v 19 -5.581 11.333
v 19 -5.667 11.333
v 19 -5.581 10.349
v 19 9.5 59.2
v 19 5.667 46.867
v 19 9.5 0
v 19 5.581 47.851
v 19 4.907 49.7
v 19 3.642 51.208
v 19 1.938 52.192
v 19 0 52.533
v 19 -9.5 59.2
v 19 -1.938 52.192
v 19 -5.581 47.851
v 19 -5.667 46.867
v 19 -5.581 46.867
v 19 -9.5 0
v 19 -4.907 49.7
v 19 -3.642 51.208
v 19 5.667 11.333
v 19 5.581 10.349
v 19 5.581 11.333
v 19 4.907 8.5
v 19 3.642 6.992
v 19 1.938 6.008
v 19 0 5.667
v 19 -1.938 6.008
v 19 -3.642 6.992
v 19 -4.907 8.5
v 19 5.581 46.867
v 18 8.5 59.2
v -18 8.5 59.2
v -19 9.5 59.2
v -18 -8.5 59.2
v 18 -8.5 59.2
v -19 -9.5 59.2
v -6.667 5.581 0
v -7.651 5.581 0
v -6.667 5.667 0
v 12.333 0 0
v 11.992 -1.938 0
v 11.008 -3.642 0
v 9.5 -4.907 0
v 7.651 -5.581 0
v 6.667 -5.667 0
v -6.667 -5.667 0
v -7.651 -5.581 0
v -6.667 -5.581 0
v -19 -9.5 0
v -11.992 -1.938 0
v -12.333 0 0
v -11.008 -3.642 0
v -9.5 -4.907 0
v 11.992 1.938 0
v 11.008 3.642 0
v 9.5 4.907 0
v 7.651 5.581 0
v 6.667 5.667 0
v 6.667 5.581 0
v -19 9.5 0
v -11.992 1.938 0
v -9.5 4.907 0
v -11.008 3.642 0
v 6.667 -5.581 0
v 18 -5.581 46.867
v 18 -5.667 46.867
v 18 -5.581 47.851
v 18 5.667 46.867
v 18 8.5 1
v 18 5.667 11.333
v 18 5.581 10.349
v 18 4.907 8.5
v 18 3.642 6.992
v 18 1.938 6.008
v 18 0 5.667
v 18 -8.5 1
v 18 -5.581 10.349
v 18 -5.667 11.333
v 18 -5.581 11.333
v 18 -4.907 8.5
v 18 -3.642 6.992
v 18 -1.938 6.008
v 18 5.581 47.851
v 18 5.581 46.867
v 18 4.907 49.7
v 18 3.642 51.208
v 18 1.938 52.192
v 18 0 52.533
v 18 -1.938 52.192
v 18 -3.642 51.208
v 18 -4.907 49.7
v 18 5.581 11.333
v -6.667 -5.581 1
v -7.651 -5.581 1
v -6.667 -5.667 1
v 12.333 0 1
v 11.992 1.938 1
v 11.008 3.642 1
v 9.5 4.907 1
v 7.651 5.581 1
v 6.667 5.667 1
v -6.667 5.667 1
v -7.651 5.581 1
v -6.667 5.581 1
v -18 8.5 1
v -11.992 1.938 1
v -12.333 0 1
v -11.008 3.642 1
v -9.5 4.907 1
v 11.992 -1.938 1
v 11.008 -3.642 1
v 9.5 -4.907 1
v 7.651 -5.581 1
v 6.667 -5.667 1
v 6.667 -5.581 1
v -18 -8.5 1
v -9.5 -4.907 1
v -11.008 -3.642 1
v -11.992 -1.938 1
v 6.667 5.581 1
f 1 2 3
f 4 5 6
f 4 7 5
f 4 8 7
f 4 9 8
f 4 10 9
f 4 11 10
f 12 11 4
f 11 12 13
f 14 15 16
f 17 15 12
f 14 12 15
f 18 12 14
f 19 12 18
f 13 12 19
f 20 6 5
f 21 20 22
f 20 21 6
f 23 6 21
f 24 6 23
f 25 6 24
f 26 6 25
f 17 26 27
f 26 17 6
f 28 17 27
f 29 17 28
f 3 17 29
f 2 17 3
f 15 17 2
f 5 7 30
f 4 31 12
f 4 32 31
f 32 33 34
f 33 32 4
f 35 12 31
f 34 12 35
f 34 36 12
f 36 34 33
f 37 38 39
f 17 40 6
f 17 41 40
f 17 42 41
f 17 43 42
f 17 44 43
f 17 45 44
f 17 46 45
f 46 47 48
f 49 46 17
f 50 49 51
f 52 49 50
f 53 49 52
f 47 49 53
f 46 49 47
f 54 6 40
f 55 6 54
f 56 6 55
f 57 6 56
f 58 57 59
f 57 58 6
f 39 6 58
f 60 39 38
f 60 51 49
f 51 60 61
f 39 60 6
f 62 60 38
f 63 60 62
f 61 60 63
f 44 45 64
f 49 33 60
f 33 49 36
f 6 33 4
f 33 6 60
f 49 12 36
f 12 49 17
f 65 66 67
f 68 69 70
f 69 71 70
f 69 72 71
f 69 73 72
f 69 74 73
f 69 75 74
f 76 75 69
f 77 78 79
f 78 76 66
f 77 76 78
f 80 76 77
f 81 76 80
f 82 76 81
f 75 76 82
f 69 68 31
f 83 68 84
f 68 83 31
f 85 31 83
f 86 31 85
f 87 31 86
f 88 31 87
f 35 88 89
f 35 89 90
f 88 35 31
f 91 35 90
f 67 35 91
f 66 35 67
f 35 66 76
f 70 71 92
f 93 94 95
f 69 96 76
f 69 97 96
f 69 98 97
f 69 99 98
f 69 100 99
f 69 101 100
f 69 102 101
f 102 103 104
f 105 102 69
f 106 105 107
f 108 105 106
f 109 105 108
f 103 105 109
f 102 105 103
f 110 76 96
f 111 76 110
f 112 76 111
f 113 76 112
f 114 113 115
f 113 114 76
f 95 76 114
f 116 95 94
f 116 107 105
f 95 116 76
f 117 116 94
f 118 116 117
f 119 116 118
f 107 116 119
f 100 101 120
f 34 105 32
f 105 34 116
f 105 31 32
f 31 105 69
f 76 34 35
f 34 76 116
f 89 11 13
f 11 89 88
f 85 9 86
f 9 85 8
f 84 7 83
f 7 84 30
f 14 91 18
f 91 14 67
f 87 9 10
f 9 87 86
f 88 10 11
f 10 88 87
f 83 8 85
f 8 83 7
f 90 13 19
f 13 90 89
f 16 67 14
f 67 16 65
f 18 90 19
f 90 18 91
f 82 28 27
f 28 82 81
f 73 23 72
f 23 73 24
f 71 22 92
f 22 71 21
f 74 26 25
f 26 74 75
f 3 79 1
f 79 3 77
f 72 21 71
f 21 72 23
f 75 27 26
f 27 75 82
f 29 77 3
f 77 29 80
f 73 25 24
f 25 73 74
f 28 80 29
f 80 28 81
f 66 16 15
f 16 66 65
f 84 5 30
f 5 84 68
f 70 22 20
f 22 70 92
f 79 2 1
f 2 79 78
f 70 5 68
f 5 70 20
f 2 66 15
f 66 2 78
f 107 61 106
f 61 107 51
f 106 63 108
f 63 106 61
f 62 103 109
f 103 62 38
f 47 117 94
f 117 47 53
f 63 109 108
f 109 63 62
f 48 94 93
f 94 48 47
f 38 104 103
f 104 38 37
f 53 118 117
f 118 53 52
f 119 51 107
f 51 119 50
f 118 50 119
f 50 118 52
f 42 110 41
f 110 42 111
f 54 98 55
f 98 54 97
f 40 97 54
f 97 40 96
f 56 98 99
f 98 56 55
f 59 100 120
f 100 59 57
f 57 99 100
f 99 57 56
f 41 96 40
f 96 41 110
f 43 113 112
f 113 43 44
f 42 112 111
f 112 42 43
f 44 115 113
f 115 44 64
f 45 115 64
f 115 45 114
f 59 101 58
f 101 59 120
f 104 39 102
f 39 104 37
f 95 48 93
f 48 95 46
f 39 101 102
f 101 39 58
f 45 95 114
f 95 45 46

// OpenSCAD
//match case
width=36;
thickness=17;
height=58.2;
shell=1;
slot=thickness/1.5;

difference(){
//outside box
translate([-(width+shell*2)/2,-(thickness+shell*2)/2,0]){
    cube([width+shell*2, thickness+shell*2, height+shell]);
    }
//inside box
translate([-width/2,-thickness/2,shell]){
    cube([width, thickness, height+shell*2]);
    }

//slot in the side to light the match
//circle1
    translate([width/2.2,0,height-slot]){
rotate(a = 90, v=[0, 1, 0]) cylinder(r=slot/2, h=shell*4);
}
//circle2
translate([width/2.2,0,slot]){
rotate(a = 90, v=[0, 1, 0]) cylinder(r=slot/2, h=shell*4);
}
//square
translate([width/2.2,-slot/2,slot]){
    cube([shell*4, slot, (height-slot*2)]);
}
//slot in the bottom to open
//circle1
    translate([-width*0.5+slot,0,-shell*2]){
cylinder(r=slot/2, h=shell*4);
}
//circle2
translate([width*0.5-slot,0,-shell*2]){
cylinder(r=slot/2, h=shell*4);
}
//square
translate([-width*0.5+slot,-slot/2,-shell*2]){
    cube([width-slot*2, slot, shell*4]);
}


}

